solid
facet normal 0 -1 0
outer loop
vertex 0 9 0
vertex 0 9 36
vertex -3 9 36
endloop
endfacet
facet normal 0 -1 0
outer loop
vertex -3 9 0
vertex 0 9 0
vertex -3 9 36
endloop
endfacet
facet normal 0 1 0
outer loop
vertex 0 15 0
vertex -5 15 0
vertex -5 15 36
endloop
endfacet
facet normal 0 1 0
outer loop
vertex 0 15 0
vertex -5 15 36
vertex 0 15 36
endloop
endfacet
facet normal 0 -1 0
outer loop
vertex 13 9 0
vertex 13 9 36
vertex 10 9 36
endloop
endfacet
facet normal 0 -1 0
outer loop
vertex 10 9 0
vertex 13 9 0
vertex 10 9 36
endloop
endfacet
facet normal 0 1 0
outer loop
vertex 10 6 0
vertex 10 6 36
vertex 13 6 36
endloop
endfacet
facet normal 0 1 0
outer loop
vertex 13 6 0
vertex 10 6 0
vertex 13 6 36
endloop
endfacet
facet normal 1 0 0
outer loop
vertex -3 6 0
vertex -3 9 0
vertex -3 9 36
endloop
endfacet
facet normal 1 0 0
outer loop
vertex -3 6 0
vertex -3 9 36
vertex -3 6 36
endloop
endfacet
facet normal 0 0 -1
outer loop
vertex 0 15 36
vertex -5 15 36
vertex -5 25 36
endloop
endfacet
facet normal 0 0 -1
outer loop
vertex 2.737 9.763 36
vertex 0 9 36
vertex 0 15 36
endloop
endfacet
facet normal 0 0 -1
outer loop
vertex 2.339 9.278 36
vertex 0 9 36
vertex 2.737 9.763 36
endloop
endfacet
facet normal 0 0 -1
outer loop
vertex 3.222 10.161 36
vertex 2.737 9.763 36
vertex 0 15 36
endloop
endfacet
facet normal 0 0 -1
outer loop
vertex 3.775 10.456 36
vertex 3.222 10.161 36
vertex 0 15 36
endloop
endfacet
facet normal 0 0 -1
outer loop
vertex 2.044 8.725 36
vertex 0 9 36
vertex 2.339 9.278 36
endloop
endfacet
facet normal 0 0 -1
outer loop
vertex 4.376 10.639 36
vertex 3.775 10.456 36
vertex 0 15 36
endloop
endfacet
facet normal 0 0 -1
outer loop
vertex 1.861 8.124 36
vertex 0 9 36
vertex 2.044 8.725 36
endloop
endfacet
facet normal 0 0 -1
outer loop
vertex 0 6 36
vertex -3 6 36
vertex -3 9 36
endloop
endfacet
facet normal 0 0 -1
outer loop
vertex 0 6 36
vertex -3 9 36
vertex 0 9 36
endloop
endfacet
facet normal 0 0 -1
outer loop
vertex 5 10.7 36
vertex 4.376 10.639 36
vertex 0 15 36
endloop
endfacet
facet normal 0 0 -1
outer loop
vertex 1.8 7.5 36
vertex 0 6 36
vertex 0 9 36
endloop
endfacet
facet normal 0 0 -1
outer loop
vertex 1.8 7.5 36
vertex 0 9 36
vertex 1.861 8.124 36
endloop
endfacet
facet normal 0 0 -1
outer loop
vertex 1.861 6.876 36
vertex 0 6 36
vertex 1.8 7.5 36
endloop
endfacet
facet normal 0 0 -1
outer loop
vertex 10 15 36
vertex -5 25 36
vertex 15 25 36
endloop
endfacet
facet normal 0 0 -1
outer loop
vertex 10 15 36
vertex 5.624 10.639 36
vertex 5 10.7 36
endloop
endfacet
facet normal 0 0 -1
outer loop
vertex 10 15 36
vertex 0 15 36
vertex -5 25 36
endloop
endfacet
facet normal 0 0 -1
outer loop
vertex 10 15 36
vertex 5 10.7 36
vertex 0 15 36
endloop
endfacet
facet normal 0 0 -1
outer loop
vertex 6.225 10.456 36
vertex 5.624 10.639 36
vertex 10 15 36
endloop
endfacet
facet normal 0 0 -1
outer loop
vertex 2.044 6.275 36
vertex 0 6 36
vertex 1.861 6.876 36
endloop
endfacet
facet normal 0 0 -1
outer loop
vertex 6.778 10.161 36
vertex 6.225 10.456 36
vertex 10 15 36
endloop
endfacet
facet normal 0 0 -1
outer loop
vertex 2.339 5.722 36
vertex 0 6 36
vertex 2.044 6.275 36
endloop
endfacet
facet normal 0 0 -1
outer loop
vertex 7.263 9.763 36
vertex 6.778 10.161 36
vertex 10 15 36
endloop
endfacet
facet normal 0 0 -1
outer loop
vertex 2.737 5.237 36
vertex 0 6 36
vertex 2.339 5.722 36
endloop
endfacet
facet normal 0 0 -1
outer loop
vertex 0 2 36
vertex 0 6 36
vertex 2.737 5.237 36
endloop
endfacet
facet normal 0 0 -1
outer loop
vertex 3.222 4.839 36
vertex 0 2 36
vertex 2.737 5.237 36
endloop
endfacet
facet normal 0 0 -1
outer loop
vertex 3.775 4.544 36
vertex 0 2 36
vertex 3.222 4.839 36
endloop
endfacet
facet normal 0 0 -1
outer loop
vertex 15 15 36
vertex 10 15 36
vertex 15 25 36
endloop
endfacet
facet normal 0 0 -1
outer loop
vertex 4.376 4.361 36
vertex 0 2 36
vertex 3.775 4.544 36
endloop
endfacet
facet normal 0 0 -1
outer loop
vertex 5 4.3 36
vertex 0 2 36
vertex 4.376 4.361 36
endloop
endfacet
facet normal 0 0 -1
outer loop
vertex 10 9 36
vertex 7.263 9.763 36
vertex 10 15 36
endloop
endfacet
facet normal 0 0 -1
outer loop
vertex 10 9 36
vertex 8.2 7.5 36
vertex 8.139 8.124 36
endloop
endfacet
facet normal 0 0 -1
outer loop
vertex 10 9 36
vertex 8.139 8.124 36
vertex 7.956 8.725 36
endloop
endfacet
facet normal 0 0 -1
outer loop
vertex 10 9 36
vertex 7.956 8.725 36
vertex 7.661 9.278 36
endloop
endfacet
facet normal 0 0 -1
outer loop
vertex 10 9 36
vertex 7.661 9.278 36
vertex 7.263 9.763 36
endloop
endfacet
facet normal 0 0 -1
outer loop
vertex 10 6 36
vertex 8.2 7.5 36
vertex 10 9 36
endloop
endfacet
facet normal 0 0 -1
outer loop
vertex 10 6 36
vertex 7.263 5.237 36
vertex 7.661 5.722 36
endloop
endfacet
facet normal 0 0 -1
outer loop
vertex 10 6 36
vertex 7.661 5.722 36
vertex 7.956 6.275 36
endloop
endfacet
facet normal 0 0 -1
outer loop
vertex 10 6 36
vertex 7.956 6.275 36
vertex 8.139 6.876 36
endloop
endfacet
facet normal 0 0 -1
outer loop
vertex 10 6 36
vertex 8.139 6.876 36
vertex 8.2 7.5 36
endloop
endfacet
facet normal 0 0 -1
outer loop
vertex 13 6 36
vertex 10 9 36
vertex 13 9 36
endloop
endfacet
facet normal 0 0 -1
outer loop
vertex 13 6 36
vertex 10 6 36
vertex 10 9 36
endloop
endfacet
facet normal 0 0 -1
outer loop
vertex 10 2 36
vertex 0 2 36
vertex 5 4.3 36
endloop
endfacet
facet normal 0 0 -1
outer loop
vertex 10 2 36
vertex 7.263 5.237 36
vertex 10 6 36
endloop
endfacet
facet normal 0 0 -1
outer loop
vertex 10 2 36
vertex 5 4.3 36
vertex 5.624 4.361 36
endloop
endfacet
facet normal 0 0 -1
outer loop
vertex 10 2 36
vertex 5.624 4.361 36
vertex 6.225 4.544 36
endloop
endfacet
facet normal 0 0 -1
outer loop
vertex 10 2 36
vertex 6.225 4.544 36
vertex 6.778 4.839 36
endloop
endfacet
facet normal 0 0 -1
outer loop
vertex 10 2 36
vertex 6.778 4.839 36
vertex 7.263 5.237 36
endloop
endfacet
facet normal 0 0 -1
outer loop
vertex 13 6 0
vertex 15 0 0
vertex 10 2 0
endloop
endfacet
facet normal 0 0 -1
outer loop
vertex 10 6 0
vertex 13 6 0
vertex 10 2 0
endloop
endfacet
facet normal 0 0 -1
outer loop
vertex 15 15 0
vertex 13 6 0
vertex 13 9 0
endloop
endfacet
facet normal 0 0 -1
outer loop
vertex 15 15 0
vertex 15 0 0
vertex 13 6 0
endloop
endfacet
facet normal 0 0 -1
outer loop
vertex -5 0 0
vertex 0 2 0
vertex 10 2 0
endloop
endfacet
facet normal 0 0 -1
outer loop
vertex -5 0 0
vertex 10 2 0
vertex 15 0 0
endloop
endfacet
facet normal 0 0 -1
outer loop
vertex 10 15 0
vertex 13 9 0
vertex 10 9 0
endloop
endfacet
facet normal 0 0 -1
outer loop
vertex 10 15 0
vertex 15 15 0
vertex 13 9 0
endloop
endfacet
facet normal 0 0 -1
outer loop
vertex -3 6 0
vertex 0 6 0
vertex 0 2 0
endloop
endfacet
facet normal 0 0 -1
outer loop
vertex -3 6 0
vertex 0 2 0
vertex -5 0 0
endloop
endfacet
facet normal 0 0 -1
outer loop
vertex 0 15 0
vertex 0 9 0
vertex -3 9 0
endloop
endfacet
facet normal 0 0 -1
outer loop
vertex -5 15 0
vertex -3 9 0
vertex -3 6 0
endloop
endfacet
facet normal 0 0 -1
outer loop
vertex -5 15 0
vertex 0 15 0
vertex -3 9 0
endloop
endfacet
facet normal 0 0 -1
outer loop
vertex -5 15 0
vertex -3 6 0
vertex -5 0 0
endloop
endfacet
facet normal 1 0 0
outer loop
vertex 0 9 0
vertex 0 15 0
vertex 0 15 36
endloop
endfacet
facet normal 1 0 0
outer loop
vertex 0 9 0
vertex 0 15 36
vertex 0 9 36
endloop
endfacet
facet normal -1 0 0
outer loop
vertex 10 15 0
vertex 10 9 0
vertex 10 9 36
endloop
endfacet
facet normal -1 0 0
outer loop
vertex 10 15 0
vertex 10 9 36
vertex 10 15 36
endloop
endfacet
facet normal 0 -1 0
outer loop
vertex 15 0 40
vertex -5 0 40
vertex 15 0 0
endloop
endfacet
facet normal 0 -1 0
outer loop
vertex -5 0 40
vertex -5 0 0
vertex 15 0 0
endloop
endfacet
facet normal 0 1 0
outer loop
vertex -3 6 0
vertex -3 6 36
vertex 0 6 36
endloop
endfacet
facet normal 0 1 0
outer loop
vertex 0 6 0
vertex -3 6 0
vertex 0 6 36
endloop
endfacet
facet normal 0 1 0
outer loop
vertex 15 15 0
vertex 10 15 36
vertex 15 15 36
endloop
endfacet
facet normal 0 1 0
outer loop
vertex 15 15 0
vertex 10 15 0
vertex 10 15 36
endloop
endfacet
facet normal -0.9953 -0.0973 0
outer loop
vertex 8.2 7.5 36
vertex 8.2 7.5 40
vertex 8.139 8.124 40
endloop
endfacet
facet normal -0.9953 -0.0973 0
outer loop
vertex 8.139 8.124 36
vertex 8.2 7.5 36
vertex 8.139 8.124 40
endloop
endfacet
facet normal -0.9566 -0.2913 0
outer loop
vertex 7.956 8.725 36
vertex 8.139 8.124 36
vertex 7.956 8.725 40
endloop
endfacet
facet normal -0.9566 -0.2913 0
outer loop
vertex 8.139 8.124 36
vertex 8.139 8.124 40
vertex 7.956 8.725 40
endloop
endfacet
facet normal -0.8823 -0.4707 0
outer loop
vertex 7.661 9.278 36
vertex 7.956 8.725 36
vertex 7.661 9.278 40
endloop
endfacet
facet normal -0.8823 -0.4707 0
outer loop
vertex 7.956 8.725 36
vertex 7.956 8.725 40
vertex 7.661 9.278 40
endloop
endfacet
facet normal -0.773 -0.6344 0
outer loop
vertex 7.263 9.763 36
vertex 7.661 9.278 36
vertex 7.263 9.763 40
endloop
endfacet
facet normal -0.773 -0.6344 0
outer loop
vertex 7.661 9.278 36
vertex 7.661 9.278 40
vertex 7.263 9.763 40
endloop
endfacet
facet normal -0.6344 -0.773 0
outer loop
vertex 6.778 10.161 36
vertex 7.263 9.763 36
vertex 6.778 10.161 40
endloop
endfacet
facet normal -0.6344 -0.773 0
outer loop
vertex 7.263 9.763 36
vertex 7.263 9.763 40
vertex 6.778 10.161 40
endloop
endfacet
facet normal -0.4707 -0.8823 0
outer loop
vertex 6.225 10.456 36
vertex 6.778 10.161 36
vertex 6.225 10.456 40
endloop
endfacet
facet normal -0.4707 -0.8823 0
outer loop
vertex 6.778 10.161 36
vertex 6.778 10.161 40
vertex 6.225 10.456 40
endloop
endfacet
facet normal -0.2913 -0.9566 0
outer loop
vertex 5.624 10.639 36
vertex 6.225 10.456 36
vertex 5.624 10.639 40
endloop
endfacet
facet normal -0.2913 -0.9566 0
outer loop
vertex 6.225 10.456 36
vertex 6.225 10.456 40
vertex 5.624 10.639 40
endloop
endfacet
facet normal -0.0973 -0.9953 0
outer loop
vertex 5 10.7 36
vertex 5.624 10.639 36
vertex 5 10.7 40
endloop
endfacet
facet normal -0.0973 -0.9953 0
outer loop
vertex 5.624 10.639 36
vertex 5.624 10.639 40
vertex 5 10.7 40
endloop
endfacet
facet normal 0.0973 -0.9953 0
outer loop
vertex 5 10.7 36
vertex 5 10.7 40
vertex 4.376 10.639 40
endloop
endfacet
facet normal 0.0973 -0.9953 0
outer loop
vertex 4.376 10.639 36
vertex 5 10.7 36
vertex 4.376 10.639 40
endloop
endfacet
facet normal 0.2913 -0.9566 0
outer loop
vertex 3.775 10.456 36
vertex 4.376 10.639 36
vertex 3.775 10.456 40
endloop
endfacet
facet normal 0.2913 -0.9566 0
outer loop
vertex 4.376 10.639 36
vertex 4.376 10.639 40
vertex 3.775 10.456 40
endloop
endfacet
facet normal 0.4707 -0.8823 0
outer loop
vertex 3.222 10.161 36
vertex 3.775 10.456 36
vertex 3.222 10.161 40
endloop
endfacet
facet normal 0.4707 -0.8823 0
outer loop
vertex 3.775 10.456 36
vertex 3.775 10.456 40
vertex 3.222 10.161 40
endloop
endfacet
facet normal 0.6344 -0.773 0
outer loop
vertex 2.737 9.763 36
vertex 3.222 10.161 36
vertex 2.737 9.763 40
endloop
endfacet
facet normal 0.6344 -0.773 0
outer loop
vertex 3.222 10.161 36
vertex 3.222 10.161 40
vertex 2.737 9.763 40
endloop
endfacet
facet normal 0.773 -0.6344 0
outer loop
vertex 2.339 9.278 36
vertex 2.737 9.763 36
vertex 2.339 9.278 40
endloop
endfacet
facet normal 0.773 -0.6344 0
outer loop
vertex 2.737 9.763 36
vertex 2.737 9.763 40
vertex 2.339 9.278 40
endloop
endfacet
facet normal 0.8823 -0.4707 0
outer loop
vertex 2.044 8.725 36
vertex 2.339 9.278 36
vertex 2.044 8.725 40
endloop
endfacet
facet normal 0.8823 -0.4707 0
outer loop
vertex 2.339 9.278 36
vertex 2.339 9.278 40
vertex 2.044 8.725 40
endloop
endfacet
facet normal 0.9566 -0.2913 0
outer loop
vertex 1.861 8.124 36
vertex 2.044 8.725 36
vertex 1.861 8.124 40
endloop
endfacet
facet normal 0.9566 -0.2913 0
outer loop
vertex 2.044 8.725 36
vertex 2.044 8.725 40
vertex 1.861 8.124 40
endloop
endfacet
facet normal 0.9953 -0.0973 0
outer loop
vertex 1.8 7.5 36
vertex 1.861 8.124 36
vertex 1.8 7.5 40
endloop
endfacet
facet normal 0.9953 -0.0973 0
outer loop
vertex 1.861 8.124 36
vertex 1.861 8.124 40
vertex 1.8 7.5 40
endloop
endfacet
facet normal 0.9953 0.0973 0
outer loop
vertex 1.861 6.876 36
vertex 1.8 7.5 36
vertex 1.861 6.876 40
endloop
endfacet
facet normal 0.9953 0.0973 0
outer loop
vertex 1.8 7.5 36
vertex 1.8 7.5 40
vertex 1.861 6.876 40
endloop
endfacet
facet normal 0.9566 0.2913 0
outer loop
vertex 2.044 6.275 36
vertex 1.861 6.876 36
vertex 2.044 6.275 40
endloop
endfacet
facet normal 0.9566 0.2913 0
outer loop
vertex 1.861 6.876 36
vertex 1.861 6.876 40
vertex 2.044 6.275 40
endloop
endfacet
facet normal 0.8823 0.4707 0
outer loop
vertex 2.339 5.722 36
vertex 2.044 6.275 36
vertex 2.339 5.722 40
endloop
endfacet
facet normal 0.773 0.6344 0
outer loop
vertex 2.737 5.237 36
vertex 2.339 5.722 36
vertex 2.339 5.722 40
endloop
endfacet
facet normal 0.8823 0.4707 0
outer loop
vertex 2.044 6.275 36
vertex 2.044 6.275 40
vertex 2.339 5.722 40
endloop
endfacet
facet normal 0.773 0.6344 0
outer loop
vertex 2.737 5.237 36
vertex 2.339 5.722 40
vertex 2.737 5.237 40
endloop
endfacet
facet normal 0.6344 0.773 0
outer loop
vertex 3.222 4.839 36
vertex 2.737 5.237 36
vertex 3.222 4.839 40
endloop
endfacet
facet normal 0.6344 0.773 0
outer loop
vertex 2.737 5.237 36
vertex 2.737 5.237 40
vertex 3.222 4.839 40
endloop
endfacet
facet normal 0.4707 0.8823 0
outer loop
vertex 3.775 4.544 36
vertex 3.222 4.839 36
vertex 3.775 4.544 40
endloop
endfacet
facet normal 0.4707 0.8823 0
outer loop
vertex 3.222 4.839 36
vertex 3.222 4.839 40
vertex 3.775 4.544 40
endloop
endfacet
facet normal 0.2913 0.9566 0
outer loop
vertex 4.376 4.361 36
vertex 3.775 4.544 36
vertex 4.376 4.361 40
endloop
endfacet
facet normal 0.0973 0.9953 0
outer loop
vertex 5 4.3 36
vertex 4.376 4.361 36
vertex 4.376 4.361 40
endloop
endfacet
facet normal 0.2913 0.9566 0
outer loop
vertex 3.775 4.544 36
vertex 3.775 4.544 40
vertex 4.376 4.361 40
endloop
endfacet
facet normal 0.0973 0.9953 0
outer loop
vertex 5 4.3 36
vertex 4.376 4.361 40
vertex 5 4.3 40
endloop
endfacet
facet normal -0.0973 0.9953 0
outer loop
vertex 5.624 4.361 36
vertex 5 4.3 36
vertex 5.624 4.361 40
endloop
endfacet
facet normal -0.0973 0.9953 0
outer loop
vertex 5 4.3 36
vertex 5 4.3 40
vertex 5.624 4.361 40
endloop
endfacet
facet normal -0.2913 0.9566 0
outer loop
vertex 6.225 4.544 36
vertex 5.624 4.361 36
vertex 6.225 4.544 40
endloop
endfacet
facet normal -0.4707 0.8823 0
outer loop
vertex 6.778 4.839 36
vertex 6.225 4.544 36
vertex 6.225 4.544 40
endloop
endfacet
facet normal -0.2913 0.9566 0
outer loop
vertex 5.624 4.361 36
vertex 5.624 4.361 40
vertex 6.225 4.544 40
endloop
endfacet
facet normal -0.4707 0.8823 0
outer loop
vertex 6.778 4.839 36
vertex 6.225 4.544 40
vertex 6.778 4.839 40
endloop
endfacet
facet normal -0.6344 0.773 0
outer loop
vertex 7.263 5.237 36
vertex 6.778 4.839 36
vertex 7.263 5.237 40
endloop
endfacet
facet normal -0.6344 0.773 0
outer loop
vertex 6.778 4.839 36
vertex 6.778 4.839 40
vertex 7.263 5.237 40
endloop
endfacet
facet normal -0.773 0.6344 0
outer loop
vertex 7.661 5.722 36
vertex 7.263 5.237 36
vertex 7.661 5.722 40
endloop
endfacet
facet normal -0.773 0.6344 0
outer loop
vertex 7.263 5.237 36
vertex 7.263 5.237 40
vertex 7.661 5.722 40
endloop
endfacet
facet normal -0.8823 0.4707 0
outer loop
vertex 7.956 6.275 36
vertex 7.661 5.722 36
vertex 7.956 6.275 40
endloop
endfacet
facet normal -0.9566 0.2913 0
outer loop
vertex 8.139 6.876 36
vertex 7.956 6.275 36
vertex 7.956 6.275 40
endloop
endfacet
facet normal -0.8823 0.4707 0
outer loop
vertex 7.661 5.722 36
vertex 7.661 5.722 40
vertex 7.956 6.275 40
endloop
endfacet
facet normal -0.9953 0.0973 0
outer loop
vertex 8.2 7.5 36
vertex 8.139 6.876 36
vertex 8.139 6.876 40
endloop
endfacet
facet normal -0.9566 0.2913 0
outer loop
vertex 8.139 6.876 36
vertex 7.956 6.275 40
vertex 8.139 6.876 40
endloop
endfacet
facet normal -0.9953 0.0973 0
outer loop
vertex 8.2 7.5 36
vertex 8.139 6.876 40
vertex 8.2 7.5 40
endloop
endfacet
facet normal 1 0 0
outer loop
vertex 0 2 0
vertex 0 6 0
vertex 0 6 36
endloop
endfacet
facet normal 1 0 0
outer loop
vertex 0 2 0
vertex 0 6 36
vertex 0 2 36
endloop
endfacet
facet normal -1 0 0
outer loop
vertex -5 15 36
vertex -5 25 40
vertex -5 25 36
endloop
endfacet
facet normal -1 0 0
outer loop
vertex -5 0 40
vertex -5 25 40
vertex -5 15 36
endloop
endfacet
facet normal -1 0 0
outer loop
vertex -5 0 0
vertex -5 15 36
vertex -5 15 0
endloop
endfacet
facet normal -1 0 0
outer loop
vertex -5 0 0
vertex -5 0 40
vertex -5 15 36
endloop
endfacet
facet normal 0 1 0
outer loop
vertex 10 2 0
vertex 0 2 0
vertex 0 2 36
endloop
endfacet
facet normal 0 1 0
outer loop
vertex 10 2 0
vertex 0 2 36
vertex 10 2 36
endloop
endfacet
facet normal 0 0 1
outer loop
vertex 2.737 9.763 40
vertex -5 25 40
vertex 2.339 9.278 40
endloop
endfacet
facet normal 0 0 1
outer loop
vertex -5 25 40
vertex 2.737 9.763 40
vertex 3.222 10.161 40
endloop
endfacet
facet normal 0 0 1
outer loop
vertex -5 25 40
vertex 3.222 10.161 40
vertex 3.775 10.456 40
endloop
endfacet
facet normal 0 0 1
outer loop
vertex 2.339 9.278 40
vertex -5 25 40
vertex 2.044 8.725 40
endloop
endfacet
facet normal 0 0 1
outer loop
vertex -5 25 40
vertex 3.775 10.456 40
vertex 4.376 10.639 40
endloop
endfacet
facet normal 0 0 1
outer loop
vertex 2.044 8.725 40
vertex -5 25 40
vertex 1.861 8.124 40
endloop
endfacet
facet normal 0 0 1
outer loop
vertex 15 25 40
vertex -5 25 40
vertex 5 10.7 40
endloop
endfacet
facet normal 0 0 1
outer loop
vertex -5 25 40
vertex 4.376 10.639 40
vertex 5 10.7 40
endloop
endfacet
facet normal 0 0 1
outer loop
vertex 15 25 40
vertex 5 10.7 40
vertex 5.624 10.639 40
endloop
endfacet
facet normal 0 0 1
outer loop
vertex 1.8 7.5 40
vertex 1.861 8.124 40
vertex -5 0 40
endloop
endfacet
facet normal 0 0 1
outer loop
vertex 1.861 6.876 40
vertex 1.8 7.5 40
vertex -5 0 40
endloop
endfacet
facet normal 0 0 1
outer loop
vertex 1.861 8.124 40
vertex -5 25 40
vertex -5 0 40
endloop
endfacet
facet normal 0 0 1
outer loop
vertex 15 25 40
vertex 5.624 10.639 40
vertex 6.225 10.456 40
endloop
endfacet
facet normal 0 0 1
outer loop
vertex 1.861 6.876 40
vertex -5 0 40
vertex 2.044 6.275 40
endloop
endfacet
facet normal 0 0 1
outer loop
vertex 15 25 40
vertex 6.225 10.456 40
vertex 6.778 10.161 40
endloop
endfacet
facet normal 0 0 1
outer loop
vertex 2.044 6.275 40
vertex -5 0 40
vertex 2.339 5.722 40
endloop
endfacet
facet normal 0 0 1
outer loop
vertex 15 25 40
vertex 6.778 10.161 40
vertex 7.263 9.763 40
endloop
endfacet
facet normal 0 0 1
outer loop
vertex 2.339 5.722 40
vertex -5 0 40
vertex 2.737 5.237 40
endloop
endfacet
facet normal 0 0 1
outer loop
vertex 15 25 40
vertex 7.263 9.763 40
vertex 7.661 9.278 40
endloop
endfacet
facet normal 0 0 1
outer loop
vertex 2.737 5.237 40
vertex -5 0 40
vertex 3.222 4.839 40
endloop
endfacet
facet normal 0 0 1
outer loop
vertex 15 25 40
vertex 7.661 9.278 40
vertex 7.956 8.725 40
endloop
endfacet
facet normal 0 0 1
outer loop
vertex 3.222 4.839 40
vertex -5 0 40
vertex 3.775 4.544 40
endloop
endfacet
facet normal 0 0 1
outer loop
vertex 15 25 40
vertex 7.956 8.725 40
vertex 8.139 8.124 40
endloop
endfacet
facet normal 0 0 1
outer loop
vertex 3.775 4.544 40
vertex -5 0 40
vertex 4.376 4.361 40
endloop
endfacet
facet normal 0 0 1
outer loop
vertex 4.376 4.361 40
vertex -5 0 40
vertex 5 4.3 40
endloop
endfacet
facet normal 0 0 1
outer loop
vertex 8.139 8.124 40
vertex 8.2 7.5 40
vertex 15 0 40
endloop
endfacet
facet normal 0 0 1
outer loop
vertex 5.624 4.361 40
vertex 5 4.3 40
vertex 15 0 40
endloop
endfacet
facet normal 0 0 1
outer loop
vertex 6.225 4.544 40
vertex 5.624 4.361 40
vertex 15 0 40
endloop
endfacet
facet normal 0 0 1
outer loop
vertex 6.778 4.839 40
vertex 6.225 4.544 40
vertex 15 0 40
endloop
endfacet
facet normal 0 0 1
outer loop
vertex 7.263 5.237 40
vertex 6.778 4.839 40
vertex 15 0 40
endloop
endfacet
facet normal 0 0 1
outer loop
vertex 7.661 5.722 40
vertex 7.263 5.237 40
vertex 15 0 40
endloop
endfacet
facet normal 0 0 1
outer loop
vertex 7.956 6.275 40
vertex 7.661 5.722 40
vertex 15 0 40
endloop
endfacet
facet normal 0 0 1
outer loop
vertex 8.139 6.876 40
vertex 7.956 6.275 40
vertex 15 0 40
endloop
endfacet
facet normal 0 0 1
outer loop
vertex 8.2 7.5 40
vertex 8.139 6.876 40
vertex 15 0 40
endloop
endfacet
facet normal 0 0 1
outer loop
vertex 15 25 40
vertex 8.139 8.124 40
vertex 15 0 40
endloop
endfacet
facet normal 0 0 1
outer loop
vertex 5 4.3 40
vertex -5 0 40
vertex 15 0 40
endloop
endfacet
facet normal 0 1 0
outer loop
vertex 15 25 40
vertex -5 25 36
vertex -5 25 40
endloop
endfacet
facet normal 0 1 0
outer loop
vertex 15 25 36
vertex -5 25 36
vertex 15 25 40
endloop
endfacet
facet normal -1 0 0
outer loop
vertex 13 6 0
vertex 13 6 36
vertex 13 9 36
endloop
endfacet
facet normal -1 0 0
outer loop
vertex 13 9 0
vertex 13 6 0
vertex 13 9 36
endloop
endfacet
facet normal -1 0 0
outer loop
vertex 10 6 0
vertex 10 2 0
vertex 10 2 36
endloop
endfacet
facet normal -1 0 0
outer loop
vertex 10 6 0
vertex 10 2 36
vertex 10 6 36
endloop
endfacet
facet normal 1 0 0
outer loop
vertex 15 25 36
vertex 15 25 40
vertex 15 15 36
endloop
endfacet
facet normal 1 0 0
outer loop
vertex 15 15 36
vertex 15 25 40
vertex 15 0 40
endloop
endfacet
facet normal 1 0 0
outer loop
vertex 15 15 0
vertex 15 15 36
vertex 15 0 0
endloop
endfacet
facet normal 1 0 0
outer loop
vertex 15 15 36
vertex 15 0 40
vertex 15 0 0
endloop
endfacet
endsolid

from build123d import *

# Parameters (mm, degrees)
BOSS_EXTRU_1_DEPTH      = 36
ESQUISSE2_W             = 20
ESQUISSE2_H             = 15
BOSS_EXTRU_2_DEPTH      = 4
ESQUISSE3_R             = 3.2
ENL_V_MAT_EXTRU_1_DEPTH = 4
ESQUISSE4_W             = 20
ESQUISSE4_H             = 4
BOSS_EXTRU_3_DEPTH      = 10


with BuildPart() as part:
    # Esquisse1 → Boss.-Extru.1 (new body)
    with BuildSketch(Plane.XY):
        Polygon((0, 0), (-5, 0), (-5, 15), (0, 15), (0, 9), (-3, 9), (-3, 6), (0, 6), (0, 2), (10, 2), (10, 6), (13, 6), (13, 9), (10, 9), (10, 15), (15, 15), (15, 0), (10, 0), align=None)
    extrude(amount=BOSS_EXTRU_1_DEPTH)

    # Esquisse2 → Boss.-Extru.2 (add)
    with BuildSketch(Plane.XY.offset(36)):
        with Locations((5, 7.5)):
            Rectangle(ESQUISSE2_W, ESQUISSE2_H)
    extrude(amount=BOSS_EXTRU_2_DEPTH)

    # Esquisse3 → Enlèv. mat.-Extru.1 (cut)
    with BuildSketch(Plane.XY.offset(40)):
        with Locations((5, 7.5)):
            Circle(ESQUISSE3_R)
    extrude(amount=-ENL_V_MAT_EXTRU_1_DEPTH, mode=Mode.SUBTRACT)

    # Esquisse4 → Boss.-Extru.3 (add)
    with BuildSketch(Plane(origin=(0, 15, 0), x_dir=(1, 0, 0), z_dir=(0, 1, 0))):
        with Locations((5, -38)):
            Rectangle(ESQUISSE4_W, ESQUISSE4_H)
    extrude(amount=BOSS_EXTRU_3_DEPTH)


solid = part.part
